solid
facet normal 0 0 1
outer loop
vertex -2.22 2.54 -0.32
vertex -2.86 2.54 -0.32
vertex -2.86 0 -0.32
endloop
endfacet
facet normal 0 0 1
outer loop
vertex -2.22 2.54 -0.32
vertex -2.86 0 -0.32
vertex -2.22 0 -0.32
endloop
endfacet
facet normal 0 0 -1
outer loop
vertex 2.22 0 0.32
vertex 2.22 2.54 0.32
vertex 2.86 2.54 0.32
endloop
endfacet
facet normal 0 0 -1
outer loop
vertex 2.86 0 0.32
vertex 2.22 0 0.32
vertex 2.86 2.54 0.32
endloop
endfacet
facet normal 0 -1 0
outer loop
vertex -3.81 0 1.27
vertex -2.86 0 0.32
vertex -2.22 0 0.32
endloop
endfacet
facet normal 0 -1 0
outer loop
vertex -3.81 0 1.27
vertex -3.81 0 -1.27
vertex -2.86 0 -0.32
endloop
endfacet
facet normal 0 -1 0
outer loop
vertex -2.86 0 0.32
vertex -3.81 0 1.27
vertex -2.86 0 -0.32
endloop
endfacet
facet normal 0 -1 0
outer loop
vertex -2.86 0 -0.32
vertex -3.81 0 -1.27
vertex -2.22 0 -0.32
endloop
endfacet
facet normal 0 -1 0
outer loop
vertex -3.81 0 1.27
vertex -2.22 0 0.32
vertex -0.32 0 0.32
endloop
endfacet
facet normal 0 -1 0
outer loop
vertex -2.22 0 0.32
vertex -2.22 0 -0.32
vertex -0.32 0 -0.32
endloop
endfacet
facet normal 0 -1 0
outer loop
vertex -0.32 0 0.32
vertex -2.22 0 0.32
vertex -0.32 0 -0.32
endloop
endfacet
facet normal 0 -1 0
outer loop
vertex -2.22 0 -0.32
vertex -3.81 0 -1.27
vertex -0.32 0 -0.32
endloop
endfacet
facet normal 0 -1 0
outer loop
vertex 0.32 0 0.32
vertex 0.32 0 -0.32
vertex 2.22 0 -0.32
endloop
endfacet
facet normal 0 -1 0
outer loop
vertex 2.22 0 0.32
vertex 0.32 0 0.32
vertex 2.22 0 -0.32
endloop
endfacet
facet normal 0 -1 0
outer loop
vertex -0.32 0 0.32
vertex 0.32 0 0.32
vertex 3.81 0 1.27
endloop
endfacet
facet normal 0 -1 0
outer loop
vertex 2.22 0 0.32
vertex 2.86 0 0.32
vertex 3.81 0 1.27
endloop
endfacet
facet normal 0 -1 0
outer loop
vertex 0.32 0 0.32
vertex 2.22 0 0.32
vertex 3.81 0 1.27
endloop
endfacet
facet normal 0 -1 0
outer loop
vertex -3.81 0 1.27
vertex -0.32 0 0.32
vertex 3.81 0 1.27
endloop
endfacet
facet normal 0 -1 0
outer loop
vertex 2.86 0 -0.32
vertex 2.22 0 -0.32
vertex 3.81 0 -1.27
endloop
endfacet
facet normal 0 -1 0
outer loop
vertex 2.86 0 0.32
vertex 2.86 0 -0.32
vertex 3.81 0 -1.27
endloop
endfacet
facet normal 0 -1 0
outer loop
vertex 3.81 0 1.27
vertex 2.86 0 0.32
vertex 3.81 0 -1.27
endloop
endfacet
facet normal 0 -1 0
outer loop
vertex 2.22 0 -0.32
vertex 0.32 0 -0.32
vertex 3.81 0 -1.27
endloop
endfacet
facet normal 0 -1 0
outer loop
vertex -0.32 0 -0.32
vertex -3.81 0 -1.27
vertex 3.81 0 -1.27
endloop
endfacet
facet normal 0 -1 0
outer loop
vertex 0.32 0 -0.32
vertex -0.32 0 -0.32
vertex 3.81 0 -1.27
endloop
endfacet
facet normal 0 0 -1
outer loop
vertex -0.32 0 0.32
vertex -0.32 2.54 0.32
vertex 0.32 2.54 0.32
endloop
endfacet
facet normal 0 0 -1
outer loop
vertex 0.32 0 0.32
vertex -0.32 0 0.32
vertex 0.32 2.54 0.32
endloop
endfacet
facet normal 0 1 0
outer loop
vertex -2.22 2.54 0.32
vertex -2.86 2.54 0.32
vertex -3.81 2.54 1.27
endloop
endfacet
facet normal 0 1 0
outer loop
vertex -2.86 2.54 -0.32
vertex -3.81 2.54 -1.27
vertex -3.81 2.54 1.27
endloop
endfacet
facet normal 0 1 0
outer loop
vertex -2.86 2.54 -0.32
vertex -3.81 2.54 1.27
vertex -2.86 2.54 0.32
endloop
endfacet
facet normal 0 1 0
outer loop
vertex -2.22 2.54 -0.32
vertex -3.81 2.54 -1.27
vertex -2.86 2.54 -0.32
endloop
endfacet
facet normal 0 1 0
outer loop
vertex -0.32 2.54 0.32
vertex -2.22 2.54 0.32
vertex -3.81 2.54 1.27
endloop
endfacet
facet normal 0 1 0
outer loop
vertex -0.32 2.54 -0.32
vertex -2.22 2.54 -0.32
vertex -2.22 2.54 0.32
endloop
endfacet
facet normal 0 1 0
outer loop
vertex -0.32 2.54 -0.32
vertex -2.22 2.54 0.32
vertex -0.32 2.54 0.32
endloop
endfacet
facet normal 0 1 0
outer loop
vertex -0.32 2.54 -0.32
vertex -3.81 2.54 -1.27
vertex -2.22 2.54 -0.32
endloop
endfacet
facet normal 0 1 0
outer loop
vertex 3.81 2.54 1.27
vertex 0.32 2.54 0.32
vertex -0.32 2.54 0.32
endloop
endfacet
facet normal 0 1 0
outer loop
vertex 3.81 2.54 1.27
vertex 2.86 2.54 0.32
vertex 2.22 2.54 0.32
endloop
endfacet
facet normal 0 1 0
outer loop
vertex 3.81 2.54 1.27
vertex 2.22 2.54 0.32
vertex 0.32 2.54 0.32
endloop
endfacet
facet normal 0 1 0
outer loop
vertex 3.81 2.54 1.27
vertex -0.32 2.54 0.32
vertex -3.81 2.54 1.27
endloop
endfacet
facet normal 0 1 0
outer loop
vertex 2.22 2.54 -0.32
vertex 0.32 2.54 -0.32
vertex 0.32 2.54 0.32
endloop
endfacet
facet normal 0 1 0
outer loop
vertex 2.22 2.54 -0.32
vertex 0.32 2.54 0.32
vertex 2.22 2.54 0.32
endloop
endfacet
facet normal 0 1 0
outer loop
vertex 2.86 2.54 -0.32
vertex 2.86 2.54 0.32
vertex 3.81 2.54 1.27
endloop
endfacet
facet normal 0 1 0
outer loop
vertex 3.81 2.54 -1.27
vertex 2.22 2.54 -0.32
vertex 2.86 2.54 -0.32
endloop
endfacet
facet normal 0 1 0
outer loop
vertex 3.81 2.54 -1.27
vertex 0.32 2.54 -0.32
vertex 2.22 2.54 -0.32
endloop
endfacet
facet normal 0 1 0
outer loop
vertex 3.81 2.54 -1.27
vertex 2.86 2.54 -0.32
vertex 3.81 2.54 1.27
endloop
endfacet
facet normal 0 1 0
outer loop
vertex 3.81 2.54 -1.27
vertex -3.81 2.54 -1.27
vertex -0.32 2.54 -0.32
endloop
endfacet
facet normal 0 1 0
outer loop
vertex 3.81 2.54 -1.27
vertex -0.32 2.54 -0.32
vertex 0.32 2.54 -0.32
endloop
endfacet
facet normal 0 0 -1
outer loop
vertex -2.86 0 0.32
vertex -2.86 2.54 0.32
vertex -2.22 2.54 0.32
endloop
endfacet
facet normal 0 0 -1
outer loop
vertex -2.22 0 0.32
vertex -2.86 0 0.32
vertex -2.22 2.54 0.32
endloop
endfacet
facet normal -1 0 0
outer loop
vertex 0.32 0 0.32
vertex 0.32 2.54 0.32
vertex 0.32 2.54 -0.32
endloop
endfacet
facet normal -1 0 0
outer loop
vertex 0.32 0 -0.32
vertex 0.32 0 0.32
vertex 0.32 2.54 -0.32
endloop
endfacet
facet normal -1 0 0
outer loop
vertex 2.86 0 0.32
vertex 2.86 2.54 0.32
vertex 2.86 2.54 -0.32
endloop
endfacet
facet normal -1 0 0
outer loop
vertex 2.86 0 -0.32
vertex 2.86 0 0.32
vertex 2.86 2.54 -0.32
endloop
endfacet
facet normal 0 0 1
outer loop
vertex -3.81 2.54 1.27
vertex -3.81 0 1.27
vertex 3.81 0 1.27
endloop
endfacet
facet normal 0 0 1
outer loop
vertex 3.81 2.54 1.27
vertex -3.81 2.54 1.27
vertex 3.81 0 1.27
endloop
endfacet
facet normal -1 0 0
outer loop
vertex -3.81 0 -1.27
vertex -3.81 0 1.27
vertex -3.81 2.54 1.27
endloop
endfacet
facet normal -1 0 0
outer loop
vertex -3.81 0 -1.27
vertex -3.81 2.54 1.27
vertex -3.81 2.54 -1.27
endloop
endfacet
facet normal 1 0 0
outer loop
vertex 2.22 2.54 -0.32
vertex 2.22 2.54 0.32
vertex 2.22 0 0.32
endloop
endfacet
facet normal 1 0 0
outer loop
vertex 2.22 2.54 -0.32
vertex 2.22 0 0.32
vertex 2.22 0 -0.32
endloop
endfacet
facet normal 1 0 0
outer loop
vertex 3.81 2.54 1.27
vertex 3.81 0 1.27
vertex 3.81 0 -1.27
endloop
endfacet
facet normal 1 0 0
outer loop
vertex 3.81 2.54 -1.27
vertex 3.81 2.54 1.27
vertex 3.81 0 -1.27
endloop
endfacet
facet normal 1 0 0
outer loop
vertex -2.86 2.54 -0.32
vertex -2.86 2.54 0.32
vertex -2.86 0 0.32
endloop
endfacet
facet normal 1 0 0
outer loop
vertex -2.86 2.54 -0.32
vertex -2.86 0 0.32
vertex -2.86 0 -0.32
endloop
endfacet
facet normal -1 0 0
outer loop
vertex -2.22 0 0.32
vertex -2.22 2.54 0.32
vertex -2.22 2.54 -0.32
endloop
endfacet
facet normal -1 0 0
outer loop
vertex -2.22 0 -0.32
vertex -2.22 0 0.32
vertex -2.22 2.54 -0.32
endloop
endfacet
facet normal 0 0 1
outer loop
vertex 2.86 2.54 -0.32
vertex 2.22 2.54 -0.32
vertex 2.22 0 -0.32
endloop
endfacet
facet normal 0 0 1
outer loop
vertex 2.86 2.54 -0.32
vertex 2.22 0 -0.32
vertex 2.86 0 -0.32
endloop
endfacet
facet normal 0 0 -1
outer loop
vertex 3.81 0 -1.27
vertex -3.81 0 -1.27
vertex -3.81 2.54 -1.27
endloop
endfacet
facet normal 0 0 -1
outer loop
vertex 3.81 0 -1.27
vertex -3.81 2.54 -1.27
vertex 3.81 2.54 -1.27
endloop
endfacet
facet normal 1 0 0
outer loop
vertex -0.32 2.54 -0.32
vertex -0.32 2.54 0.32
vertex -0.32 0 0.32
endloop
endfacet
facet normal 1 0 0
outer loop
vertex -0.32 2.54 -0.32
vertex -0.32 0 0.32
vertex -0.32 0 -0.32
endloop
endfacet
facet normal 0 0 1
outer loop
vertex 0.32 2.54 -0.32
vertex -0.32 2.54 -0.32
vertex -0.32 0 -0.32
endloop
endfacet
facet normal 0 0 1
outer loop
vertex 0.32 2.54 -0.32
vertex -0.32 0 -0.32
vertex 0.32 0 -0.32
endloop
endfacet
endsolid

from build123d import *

# Parameters (mm, degrees)
SKETCH2_W           = 7.62
SKETCH2_H           = 2.54
BOSS_EXTRUDE1_DEPTH = 2.54
SKETCH3_W           = 0.64
SKETCH3_H           = 0.64
CUT_EXTRUDE1_DEPTH  = 5.751904881


with BuildPart() as part:
    # Sketch2 → Boss-Extrude1 (new body)
    with BuildSketch(Plane(origin=(0, 0, 0), x_dir=(1, 0, 0), z_dir=(0, 1, 0))):
        Rectangle(SKETCH2_W, SKETCH2_H)
    extrude(amount=BOSS_EXTRUDE1_DEPTH)

    # Sketch3 → Cut-Extrude1 (cut, through all)
    with BuildSketch(Plane(origin=(0, 2.54, 0), x_dir=(1, 0, 0), z_dir=(0, 1, 0))):
        Rectangle(SKETCH3_W, SKETCH3_H)
        with Locations((-2.54, 0)):
            Rectangle(SKETCH3_W, SKETCH3_H)
        with Locations((2.54, 0)):
            Rectangle(SKETCH3_W, SKETCH3_H)
    extrude(amount=-CUT_EXTRUDE1_DEPTH, mode=Mode.SUBTRACT)


solid = part.part
